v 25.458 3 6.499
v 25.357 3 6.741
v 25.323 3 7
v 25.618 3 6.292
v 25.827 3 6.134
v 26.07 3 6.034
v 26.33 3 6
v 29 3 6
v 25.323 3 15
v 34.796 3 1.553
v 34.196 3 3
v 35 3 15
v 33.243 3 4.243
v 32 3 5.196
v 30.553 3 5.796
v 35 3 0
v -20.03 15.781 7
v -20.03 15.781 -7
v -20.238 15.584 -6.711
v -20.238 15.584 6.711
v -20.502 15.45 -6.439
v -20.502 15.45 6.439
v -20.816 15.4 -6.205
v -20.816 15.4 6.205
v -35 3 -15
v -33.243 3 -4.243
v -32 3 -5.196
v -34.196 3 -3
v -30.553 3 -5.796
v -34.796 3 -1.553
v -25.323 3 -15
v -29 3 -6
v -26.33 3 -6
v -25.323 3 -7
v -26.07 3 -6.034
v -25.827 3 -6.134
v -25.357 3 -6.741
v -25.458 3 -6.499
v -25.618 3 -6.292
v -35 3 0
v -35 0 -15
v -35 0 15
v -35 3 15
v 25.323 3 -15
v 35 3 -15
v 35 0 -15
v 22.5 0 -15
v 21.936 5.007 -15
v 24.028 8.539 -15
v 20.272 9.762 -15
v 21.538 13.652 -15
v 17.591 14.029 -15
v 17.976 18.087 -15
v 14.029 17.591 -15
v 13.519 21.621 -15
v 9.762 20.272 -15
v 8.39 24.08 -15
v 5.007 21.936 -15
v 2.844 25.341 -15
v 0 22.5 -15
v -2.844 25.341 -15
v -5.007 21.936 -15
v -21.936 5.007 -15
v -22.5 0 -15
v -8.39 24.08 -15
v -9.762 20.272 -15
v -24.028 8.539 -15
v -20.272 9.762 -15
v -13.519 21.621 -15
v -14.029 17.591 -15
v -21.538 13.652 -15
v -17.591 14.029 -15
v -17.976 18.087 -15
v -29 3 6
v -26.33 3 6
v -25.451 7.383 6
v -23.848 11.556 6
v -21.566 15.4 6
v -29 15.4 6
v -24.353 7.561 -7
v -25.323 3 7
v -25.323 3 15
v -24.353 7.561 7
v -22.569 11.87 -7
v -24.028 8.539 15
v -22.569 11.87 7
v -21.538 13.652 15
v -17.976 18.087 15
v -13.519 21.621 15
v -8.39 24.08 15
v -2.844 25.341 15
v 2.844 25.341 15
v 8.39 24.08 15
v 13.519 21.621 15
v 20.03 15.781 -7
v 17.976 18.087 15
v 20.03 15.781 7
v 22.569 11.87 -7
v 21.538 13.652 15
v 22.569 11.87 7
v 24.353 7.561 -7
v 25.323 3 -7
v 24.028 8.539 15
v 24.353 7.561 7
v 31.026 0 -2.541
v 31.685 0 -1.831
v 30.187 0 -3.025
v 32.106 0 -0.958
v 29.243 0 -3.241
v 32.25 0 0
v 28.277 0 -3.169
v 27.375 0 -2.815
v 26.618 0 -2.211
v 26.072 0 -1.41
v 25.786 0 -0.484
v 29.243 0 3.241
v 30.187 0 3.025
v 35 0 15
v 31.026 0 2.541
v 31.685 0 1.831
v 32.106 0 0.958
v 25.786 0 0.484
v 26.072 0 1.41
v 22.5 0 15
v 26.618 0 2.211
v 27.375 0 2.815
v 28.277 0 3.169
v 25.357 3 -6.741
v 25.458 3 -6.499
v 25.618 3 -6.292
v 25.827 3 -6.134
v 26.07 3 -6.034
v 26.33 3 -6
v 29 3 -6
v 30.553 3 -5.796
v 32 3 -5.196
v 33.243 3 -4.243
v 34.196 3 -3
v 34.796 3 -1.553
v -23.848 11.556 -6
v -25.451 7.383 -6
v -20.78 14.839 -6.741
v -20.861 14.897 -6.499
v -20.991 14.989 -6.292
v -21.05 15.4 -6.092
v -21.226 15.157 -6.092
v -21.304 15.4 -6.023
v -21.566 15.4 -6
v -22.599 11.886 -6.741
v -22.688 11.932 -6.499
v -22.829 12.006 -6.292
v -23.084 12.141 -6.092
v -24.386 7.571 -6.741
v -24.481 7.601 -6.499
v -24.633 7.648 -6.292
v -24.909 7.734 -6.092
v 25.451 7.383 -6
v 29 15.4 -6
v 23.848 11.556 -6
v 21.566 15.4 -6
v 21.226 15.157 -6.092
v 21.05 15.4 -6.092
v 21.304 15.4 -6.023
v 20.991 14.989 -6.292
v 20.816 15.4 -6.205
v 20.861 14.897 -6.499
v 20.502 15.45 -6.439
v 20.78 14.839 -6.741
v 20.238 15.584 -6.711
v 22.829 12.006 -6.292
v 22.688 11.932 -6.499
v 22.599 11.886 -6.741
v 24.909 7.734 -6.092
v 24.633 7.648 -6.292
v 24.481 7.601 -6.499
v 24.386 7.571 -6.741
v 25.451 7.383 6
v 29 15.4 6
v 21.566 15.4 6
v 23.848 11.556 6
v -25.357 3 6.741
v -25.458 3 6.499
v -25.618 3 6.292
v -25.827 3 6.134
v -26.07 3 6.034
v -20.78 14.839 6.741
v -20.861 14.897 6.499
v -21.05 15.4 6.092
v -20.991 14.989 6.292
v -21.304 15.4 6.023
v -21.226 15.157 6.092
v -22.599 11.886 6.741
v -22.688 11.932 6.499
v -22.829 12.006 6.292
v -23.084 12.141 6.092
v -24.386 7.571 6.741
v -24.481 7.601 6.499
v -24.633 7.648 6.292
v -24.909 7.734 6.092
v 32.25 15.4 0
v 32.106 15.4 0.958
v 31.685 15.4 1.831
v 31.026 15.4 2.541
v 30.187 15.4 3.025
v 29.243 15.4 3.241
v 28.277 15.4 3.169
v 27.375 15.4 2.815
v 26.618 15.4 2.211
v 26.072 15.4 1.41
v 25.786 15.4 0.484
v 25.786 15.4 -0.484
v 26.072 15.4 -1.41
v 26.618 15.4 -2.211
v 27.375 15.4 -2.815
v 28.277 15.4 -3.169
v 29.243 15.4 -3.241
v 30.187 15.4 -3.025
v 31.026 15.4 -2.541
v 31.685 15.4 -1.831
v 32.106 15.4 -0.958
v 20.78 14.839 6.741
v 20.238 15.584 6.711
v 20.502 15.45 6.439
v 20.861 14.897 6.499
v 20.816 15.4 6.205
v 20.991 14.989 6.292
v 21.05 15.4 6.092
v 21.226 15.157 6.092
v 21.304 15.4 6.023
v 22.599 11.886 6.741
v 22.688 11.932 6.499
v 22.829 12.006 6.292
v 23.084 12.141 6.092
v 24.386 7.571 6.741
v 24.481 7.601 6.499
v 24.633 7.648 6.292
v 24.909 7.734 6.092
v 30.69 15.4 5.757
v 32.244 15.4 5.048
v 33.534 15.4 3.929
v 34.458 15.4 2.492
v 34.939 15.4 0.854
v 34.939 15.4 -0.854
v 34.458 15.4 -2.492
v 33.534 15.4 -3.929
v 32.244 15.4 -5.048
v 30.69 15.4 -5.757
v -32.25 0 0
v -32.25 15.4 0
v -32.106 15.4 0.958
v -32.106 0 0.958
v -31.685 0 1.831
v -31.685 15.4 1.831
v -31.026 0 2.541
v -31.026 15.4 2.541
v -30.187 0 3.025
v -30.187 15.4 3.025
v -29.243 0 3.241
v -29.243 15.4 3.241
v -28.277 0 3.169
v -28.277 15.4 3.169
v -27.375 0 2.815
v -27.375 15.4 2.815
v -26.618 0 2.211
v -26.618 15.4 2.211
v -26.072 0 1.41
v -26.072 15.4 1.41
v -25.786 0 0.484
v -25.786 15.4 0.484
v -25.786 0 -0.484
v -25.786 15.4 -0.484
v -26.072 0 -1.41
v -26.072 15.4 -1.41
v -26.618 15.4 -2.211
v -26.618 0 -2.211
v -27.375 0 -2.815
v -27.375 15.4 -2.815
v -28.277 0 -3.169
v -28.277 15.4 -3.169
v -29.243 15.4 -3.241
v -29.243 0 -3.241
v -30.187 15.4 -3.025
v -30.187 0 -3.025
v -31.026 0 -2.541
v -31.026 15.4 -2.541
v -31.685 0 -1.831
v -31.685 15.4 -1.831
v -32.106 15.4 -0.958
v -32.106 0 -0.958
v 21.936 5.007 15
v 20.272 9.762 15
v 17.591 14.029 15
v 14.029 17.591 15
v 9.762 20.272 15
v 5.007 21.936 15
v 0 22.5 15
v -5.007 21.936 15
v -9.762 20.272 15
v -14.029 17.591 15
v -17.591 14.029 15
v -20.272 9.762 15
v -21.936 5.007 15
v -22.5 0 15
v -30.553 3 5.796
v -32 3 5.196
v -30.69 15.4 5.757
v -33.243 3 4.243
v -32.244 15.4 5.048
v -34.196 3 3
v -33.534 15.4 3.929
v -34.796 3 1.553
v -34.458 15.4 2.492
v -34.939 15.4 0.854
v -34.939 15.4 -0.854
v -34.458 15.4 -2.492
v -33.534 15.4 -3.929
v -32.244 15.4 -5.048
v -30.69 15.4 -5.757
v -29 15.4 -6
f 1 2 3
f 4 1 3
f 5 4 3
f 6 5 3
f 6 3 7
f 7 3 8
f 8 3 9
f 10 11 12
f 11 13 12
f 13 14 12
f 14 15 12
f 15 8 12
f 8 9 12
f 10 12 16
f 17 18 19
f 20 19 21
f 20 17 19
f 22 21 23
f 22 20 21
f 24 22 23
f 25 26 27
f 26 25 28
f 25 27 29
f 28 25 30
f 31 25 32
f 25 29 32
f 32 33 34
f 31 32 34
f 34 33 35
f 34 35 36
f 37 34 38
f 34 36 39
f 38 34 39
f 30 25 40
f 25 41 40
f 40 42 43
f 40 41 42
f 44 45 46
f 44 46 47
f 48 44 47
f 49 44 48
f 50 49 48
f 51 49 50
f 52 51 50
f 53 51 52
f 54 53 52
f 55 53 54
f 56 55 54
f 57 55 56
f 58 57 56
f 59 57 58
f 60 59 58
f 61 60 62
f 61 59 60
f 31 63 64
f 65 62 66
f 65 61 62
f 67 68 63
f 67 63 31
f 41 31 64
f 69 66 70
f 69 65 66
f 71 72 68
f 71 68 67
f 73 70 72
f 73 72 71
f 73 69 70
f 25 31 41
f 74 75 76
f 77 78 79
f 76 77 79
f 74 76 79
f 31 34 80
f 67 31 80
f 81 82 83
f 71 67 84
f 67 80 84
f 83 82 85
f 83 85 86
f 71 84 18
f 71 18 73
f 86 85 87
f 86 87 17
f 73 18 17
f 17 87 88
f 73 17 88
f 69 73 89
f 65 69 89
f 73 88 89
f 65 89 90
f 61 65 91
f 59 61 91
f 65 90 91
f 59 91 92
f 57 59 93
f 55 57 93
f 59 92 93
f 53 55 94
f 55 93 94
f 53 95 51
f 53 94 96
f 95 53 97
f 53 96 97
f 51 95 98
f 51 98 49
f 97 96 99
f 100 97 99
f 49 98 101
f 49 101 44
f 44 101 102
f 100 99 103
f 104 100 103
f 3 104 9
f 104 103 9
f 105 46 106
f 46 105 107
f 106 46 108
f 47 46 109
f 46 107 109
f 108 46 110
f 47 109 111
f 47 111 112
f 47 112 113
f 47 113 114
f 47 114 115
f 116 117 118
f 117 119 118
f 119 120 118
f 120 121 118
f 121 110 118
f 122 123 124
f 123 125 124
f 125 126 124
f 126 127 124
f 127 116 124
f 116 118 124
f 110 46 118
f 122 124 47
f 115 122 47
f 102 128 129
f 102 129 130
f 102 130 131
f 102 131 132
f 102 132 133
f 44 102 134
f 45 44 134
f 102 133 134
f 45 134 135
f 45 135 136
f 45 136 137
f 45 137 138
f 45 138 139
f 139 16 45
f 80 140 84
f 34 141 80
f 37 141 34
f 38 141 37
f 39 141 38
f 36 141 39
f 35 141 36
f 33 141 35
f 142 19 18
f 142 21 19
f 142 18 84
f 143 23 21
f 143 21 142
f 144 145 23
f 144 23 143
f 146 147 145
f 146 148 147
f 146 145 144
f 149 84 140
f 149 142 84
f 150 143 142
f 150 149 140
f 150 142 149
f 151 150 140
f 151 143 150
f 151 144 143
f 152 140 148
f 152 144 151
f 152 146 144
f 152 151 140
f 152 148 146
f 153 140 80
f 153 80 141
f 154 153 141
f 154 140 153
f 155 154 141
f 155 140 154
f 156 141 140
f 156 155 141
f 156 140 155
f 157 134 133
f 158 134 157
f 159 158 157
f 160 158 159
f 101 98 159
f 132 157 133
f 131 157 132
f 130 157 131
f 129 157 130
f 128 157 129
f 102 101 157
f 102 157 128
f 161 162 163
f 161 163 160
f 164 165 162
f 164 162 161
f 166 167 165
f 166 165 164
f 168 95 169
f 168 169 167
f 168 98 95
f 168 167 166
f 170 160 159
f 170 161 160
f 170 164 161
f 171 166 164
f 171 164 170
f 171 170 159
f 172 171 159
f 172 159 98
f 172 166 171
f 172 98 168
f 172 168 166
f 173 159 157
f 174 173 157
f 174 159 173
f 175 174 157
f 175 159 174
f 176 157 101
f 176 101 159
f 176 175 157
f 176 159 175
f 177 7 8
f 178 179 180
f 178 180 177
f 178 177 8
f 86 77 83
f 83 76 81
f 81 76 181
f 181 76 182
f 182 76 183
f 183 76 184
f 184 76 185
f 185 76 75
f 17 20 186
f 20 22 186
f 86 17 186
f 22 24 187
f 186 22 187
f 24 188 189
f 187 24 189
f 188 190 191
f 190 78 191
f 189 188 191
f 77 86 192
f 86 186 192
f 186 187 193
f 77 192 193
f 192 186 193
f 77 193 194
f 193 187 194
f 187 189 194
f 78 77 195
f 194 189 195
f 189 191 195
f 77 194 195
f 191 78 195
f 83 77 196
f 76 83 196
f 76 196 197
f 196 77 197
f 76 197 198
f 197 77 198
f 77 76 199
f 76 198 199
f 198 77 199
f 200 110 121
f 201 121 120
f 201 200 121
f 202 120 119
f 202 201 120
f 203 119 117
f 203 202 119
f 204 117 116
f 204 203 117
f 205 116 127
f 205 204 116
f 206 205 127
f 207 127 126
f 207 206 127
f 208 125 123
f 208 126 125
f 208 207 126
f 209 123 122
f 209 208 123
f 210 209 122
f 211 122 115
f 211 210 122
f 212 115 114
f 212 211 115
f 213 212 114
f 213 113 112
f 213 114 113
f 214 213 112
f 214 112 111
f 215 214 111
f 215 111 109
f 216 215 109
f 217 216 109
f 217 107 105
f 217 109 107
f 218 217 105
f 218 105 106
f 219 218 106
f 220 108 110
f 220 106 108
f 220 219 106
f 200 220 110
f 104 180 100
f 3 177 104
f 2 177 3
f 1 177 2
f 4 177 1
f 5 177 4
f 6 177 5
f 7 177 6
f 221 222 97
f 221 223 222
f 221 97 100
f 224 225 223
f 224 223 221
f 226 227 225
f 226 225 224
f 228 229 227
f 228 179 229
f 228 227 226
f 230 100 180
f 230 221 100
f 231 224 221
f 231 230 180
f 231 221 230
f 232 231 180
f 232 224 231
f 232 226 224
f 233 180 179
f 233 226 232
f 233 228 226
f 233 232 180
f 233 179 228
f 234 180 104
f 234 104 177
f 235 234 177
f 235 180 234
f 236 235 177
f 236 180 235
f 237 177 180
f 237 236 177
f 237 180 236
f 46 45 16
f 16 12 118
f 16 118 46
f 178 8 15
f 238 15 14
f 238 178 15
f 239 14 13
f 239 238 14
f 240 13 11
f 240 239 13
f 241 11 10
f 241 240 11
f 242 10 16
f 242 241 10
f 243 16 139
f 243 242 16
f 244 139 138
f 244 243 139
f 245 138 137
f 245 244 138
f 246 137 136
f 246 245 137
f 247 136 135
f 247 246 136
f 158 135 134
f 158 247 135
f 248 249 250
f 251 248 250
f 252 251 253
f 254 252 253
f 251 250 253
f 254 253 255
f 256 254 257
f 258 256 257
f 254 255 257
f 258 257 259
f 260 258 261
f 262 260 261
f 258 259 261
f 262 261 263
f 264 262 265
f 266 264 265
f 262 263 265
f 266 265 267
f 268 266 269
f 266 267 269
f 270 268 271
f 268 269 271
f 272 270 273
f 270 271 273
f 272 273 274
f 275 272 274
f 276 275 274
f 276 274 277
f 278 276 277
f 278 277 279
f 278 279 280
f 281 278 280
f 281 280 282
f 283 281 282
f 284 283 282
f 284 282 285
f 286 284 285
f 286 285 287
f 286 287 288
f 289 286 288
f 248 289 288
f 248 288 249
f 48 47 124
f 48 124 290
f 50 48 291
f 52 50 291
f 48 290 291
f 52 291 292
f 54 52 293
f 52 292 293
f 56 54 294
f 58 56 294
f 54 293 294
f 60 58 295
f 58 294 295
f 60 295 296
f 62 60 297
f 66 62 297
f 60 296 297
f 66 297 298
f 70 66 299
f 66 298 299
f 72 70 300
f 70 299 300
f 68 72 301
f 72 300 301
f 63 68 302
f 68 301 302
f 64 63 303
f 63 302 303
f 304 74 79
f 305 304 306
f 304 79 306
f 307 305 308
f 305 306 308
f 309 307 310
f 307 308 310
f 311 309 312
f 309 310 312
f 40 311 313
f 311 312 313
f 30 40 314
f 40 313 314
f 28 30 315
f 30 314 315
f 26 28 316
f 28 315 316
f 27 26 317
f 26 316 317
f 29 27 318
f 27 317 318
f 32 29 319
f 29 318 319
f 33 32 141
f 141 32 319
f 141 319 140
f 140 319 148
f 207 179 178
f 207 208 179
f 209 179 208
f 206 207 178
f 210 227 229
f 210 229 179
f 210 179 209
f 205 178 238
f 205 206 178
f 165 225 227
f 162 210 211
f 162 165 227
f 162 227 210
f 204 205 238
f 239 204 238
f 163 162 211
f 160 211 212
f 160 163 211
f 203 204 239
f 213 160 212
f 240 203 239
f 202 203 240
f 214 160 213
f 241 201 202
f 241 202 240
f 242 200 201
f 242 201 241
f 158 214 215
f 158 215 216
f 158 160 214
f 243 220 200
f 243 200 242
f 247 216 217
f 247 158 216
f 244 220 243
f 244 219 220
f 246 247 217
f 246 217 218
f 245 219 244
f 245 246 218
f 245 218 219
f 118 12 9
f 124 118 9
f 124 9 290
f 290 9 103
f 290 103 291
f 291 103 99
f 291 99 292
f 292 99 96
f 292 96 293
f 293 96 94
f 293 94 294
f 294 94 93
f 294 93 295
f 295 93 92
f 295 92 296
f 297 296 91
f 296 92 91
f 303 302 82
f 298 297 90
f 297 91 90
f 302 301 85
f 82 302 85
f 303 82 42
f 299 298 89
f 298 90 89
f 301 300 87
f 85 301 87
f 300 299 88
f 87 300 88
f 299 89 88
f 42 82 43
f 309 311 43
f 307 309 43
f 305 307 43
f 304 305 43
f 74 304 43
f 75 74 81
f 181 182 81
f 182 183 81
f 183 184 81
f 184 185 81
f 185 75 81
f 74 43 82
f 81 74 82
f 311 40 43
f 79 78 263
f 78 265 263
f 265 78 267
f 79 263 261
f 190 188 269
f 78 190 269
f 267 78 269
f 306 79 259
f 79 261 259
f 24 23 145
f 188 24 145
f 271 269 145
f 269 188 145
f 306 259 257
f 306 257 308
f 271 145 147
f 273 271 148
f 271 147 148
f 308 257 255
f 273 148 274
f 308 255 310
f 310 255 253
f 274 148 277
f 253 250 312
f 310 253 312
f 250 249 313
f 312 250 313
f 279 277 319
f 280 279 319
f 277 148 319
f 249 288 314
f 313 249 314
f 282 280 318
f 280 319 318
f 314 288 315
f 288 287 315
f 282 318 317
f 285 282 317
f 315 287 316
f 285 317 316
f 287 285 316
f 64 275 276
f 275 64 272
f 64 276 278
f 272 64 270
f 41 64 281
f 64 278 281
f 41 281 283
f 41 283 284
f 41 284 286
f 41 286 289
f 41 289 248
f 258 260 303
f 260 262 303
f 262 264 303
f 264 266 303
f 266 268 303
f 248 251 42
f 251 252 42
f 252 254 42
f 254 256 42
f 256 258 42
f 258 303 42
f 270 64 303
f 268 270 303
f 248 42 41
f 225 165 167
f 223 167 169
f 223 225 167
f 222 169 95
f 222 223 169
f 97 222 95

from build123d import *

# Parameters (mm, degrees)
BOSS_EXTRUDE1_DEPTH = 15
BOSS_EXTRUDE2_REACH = 43.075
SKETCH3_R           = 3.25
CUT_EXTRUDE1_DEPTH  = 42.075053256
FILLET1_R           = 1
FILLET2_R           = 1


with BuildPart() as part:
    # Sketch1 → Boss-Extrude1 (new, symmetric)
    with BuildSketch(Plane.XY):
        with BuildLine():
            Line((-22.5, 0), (-35, 0))
            Line((-35, 0), (-35, 3))
            Line((-35, 3), (-25.322914524, 3))
            ThreePointArc((-25.322914524, 3), (0, 25.5), (25.322914524, 3))
            Line((25.322914524, 3), (35, 3))
            Line((35, 3), (35, 0))
            Line((35, 0), (22.5, 0))
            ThreePointArc((22.5, 0), (0, 22.5), (-22.5, 0))
        make_face()
    extrude(amount=BOSS_EXTRUDE1_DEPTH, both=True)

    # Sketch2 → Boss-Extrude2 (add, up to next)
    with BuildSketch(Plane(origin=(0, 15.4, 0), x_dir=(1, 0, 0), z_dir=(0, 1, 0)), mode=Mode.PRIVATE) as boss_extrude2_sk1:
        with BuildLine():
            Line((-20.12, 6), (-20.12, -6))
            Line((-20.12, -6), (-29, -6))
            ThreePointArc((-29, -6), (-35, 0), (-29, 6))
            Line((-29, 6), (-20.12, 6))
        make_face()
    boss_extrude2_tool1 = extrude(boss_extrude2_sk1.sketch, amount=-BOSS_EXTRUDE2_REACH, mode=Mode.PRIVATE) - part.part
    boss_extrude2 = boss_extrude2_tool1.solids().sort_by_distance((-26.982165, 15.4, 0))[0]
    add(boss_extrude2)

    # Sketch3 → Cut-Extrude1 (cut, through all)
    with BuildSketch(Plane(origin=(0, 15.4, 0), x_dir=(1, 0, 0), z_dir=(0, 1, 0))):
        with Locations(Location((-29, 0, 0), (0, 0, 180))):
            Circle(SKETCH3_R)
    cut_extrude1 = extrude(amount=-CUT_EXTRUDE1_DEPTH, mode=Mode.SUBTRACT)

    # Mirror1: Boss-Extrude2, Cut-Extrude1 across plane
    add(boss_extrude2.mirror(Plane(origin=(0, 0, 0), x_dir=(0, 0, 1), z_dir=(1, 0, 0))))
    add(cut_extrude1.mirror(Plane(origin=(0, 0, 0), x_dir=(0, 0, 1), z_dir=(1, 0, 0))), mode=Mode.SUBTRACT)

    # Fillet1
    fillet1_edges = [part.edges().sort_by_distance(p)[0] for p in [
        (23.65088269, 9.533401701, -6),
        (23.65088269, 9.533401701, 6),
        (20.324615618, 15.4, 0),
    ]]
    fillet(fillet1_edges, radius=FILLET1_R)

    # Fillet2
    fillet2_edges = [part.edges().sort_by_distance(p)[0] for p in [
        (-23.65088269, 9.533401701, -6),
        (-23.65088269, 9.533401701, 6),
        (-20.324615618, 15.4, 0),
    ]]
    fillet(fillet2_edges, radius=FILLET2_R)


solid = part.part
